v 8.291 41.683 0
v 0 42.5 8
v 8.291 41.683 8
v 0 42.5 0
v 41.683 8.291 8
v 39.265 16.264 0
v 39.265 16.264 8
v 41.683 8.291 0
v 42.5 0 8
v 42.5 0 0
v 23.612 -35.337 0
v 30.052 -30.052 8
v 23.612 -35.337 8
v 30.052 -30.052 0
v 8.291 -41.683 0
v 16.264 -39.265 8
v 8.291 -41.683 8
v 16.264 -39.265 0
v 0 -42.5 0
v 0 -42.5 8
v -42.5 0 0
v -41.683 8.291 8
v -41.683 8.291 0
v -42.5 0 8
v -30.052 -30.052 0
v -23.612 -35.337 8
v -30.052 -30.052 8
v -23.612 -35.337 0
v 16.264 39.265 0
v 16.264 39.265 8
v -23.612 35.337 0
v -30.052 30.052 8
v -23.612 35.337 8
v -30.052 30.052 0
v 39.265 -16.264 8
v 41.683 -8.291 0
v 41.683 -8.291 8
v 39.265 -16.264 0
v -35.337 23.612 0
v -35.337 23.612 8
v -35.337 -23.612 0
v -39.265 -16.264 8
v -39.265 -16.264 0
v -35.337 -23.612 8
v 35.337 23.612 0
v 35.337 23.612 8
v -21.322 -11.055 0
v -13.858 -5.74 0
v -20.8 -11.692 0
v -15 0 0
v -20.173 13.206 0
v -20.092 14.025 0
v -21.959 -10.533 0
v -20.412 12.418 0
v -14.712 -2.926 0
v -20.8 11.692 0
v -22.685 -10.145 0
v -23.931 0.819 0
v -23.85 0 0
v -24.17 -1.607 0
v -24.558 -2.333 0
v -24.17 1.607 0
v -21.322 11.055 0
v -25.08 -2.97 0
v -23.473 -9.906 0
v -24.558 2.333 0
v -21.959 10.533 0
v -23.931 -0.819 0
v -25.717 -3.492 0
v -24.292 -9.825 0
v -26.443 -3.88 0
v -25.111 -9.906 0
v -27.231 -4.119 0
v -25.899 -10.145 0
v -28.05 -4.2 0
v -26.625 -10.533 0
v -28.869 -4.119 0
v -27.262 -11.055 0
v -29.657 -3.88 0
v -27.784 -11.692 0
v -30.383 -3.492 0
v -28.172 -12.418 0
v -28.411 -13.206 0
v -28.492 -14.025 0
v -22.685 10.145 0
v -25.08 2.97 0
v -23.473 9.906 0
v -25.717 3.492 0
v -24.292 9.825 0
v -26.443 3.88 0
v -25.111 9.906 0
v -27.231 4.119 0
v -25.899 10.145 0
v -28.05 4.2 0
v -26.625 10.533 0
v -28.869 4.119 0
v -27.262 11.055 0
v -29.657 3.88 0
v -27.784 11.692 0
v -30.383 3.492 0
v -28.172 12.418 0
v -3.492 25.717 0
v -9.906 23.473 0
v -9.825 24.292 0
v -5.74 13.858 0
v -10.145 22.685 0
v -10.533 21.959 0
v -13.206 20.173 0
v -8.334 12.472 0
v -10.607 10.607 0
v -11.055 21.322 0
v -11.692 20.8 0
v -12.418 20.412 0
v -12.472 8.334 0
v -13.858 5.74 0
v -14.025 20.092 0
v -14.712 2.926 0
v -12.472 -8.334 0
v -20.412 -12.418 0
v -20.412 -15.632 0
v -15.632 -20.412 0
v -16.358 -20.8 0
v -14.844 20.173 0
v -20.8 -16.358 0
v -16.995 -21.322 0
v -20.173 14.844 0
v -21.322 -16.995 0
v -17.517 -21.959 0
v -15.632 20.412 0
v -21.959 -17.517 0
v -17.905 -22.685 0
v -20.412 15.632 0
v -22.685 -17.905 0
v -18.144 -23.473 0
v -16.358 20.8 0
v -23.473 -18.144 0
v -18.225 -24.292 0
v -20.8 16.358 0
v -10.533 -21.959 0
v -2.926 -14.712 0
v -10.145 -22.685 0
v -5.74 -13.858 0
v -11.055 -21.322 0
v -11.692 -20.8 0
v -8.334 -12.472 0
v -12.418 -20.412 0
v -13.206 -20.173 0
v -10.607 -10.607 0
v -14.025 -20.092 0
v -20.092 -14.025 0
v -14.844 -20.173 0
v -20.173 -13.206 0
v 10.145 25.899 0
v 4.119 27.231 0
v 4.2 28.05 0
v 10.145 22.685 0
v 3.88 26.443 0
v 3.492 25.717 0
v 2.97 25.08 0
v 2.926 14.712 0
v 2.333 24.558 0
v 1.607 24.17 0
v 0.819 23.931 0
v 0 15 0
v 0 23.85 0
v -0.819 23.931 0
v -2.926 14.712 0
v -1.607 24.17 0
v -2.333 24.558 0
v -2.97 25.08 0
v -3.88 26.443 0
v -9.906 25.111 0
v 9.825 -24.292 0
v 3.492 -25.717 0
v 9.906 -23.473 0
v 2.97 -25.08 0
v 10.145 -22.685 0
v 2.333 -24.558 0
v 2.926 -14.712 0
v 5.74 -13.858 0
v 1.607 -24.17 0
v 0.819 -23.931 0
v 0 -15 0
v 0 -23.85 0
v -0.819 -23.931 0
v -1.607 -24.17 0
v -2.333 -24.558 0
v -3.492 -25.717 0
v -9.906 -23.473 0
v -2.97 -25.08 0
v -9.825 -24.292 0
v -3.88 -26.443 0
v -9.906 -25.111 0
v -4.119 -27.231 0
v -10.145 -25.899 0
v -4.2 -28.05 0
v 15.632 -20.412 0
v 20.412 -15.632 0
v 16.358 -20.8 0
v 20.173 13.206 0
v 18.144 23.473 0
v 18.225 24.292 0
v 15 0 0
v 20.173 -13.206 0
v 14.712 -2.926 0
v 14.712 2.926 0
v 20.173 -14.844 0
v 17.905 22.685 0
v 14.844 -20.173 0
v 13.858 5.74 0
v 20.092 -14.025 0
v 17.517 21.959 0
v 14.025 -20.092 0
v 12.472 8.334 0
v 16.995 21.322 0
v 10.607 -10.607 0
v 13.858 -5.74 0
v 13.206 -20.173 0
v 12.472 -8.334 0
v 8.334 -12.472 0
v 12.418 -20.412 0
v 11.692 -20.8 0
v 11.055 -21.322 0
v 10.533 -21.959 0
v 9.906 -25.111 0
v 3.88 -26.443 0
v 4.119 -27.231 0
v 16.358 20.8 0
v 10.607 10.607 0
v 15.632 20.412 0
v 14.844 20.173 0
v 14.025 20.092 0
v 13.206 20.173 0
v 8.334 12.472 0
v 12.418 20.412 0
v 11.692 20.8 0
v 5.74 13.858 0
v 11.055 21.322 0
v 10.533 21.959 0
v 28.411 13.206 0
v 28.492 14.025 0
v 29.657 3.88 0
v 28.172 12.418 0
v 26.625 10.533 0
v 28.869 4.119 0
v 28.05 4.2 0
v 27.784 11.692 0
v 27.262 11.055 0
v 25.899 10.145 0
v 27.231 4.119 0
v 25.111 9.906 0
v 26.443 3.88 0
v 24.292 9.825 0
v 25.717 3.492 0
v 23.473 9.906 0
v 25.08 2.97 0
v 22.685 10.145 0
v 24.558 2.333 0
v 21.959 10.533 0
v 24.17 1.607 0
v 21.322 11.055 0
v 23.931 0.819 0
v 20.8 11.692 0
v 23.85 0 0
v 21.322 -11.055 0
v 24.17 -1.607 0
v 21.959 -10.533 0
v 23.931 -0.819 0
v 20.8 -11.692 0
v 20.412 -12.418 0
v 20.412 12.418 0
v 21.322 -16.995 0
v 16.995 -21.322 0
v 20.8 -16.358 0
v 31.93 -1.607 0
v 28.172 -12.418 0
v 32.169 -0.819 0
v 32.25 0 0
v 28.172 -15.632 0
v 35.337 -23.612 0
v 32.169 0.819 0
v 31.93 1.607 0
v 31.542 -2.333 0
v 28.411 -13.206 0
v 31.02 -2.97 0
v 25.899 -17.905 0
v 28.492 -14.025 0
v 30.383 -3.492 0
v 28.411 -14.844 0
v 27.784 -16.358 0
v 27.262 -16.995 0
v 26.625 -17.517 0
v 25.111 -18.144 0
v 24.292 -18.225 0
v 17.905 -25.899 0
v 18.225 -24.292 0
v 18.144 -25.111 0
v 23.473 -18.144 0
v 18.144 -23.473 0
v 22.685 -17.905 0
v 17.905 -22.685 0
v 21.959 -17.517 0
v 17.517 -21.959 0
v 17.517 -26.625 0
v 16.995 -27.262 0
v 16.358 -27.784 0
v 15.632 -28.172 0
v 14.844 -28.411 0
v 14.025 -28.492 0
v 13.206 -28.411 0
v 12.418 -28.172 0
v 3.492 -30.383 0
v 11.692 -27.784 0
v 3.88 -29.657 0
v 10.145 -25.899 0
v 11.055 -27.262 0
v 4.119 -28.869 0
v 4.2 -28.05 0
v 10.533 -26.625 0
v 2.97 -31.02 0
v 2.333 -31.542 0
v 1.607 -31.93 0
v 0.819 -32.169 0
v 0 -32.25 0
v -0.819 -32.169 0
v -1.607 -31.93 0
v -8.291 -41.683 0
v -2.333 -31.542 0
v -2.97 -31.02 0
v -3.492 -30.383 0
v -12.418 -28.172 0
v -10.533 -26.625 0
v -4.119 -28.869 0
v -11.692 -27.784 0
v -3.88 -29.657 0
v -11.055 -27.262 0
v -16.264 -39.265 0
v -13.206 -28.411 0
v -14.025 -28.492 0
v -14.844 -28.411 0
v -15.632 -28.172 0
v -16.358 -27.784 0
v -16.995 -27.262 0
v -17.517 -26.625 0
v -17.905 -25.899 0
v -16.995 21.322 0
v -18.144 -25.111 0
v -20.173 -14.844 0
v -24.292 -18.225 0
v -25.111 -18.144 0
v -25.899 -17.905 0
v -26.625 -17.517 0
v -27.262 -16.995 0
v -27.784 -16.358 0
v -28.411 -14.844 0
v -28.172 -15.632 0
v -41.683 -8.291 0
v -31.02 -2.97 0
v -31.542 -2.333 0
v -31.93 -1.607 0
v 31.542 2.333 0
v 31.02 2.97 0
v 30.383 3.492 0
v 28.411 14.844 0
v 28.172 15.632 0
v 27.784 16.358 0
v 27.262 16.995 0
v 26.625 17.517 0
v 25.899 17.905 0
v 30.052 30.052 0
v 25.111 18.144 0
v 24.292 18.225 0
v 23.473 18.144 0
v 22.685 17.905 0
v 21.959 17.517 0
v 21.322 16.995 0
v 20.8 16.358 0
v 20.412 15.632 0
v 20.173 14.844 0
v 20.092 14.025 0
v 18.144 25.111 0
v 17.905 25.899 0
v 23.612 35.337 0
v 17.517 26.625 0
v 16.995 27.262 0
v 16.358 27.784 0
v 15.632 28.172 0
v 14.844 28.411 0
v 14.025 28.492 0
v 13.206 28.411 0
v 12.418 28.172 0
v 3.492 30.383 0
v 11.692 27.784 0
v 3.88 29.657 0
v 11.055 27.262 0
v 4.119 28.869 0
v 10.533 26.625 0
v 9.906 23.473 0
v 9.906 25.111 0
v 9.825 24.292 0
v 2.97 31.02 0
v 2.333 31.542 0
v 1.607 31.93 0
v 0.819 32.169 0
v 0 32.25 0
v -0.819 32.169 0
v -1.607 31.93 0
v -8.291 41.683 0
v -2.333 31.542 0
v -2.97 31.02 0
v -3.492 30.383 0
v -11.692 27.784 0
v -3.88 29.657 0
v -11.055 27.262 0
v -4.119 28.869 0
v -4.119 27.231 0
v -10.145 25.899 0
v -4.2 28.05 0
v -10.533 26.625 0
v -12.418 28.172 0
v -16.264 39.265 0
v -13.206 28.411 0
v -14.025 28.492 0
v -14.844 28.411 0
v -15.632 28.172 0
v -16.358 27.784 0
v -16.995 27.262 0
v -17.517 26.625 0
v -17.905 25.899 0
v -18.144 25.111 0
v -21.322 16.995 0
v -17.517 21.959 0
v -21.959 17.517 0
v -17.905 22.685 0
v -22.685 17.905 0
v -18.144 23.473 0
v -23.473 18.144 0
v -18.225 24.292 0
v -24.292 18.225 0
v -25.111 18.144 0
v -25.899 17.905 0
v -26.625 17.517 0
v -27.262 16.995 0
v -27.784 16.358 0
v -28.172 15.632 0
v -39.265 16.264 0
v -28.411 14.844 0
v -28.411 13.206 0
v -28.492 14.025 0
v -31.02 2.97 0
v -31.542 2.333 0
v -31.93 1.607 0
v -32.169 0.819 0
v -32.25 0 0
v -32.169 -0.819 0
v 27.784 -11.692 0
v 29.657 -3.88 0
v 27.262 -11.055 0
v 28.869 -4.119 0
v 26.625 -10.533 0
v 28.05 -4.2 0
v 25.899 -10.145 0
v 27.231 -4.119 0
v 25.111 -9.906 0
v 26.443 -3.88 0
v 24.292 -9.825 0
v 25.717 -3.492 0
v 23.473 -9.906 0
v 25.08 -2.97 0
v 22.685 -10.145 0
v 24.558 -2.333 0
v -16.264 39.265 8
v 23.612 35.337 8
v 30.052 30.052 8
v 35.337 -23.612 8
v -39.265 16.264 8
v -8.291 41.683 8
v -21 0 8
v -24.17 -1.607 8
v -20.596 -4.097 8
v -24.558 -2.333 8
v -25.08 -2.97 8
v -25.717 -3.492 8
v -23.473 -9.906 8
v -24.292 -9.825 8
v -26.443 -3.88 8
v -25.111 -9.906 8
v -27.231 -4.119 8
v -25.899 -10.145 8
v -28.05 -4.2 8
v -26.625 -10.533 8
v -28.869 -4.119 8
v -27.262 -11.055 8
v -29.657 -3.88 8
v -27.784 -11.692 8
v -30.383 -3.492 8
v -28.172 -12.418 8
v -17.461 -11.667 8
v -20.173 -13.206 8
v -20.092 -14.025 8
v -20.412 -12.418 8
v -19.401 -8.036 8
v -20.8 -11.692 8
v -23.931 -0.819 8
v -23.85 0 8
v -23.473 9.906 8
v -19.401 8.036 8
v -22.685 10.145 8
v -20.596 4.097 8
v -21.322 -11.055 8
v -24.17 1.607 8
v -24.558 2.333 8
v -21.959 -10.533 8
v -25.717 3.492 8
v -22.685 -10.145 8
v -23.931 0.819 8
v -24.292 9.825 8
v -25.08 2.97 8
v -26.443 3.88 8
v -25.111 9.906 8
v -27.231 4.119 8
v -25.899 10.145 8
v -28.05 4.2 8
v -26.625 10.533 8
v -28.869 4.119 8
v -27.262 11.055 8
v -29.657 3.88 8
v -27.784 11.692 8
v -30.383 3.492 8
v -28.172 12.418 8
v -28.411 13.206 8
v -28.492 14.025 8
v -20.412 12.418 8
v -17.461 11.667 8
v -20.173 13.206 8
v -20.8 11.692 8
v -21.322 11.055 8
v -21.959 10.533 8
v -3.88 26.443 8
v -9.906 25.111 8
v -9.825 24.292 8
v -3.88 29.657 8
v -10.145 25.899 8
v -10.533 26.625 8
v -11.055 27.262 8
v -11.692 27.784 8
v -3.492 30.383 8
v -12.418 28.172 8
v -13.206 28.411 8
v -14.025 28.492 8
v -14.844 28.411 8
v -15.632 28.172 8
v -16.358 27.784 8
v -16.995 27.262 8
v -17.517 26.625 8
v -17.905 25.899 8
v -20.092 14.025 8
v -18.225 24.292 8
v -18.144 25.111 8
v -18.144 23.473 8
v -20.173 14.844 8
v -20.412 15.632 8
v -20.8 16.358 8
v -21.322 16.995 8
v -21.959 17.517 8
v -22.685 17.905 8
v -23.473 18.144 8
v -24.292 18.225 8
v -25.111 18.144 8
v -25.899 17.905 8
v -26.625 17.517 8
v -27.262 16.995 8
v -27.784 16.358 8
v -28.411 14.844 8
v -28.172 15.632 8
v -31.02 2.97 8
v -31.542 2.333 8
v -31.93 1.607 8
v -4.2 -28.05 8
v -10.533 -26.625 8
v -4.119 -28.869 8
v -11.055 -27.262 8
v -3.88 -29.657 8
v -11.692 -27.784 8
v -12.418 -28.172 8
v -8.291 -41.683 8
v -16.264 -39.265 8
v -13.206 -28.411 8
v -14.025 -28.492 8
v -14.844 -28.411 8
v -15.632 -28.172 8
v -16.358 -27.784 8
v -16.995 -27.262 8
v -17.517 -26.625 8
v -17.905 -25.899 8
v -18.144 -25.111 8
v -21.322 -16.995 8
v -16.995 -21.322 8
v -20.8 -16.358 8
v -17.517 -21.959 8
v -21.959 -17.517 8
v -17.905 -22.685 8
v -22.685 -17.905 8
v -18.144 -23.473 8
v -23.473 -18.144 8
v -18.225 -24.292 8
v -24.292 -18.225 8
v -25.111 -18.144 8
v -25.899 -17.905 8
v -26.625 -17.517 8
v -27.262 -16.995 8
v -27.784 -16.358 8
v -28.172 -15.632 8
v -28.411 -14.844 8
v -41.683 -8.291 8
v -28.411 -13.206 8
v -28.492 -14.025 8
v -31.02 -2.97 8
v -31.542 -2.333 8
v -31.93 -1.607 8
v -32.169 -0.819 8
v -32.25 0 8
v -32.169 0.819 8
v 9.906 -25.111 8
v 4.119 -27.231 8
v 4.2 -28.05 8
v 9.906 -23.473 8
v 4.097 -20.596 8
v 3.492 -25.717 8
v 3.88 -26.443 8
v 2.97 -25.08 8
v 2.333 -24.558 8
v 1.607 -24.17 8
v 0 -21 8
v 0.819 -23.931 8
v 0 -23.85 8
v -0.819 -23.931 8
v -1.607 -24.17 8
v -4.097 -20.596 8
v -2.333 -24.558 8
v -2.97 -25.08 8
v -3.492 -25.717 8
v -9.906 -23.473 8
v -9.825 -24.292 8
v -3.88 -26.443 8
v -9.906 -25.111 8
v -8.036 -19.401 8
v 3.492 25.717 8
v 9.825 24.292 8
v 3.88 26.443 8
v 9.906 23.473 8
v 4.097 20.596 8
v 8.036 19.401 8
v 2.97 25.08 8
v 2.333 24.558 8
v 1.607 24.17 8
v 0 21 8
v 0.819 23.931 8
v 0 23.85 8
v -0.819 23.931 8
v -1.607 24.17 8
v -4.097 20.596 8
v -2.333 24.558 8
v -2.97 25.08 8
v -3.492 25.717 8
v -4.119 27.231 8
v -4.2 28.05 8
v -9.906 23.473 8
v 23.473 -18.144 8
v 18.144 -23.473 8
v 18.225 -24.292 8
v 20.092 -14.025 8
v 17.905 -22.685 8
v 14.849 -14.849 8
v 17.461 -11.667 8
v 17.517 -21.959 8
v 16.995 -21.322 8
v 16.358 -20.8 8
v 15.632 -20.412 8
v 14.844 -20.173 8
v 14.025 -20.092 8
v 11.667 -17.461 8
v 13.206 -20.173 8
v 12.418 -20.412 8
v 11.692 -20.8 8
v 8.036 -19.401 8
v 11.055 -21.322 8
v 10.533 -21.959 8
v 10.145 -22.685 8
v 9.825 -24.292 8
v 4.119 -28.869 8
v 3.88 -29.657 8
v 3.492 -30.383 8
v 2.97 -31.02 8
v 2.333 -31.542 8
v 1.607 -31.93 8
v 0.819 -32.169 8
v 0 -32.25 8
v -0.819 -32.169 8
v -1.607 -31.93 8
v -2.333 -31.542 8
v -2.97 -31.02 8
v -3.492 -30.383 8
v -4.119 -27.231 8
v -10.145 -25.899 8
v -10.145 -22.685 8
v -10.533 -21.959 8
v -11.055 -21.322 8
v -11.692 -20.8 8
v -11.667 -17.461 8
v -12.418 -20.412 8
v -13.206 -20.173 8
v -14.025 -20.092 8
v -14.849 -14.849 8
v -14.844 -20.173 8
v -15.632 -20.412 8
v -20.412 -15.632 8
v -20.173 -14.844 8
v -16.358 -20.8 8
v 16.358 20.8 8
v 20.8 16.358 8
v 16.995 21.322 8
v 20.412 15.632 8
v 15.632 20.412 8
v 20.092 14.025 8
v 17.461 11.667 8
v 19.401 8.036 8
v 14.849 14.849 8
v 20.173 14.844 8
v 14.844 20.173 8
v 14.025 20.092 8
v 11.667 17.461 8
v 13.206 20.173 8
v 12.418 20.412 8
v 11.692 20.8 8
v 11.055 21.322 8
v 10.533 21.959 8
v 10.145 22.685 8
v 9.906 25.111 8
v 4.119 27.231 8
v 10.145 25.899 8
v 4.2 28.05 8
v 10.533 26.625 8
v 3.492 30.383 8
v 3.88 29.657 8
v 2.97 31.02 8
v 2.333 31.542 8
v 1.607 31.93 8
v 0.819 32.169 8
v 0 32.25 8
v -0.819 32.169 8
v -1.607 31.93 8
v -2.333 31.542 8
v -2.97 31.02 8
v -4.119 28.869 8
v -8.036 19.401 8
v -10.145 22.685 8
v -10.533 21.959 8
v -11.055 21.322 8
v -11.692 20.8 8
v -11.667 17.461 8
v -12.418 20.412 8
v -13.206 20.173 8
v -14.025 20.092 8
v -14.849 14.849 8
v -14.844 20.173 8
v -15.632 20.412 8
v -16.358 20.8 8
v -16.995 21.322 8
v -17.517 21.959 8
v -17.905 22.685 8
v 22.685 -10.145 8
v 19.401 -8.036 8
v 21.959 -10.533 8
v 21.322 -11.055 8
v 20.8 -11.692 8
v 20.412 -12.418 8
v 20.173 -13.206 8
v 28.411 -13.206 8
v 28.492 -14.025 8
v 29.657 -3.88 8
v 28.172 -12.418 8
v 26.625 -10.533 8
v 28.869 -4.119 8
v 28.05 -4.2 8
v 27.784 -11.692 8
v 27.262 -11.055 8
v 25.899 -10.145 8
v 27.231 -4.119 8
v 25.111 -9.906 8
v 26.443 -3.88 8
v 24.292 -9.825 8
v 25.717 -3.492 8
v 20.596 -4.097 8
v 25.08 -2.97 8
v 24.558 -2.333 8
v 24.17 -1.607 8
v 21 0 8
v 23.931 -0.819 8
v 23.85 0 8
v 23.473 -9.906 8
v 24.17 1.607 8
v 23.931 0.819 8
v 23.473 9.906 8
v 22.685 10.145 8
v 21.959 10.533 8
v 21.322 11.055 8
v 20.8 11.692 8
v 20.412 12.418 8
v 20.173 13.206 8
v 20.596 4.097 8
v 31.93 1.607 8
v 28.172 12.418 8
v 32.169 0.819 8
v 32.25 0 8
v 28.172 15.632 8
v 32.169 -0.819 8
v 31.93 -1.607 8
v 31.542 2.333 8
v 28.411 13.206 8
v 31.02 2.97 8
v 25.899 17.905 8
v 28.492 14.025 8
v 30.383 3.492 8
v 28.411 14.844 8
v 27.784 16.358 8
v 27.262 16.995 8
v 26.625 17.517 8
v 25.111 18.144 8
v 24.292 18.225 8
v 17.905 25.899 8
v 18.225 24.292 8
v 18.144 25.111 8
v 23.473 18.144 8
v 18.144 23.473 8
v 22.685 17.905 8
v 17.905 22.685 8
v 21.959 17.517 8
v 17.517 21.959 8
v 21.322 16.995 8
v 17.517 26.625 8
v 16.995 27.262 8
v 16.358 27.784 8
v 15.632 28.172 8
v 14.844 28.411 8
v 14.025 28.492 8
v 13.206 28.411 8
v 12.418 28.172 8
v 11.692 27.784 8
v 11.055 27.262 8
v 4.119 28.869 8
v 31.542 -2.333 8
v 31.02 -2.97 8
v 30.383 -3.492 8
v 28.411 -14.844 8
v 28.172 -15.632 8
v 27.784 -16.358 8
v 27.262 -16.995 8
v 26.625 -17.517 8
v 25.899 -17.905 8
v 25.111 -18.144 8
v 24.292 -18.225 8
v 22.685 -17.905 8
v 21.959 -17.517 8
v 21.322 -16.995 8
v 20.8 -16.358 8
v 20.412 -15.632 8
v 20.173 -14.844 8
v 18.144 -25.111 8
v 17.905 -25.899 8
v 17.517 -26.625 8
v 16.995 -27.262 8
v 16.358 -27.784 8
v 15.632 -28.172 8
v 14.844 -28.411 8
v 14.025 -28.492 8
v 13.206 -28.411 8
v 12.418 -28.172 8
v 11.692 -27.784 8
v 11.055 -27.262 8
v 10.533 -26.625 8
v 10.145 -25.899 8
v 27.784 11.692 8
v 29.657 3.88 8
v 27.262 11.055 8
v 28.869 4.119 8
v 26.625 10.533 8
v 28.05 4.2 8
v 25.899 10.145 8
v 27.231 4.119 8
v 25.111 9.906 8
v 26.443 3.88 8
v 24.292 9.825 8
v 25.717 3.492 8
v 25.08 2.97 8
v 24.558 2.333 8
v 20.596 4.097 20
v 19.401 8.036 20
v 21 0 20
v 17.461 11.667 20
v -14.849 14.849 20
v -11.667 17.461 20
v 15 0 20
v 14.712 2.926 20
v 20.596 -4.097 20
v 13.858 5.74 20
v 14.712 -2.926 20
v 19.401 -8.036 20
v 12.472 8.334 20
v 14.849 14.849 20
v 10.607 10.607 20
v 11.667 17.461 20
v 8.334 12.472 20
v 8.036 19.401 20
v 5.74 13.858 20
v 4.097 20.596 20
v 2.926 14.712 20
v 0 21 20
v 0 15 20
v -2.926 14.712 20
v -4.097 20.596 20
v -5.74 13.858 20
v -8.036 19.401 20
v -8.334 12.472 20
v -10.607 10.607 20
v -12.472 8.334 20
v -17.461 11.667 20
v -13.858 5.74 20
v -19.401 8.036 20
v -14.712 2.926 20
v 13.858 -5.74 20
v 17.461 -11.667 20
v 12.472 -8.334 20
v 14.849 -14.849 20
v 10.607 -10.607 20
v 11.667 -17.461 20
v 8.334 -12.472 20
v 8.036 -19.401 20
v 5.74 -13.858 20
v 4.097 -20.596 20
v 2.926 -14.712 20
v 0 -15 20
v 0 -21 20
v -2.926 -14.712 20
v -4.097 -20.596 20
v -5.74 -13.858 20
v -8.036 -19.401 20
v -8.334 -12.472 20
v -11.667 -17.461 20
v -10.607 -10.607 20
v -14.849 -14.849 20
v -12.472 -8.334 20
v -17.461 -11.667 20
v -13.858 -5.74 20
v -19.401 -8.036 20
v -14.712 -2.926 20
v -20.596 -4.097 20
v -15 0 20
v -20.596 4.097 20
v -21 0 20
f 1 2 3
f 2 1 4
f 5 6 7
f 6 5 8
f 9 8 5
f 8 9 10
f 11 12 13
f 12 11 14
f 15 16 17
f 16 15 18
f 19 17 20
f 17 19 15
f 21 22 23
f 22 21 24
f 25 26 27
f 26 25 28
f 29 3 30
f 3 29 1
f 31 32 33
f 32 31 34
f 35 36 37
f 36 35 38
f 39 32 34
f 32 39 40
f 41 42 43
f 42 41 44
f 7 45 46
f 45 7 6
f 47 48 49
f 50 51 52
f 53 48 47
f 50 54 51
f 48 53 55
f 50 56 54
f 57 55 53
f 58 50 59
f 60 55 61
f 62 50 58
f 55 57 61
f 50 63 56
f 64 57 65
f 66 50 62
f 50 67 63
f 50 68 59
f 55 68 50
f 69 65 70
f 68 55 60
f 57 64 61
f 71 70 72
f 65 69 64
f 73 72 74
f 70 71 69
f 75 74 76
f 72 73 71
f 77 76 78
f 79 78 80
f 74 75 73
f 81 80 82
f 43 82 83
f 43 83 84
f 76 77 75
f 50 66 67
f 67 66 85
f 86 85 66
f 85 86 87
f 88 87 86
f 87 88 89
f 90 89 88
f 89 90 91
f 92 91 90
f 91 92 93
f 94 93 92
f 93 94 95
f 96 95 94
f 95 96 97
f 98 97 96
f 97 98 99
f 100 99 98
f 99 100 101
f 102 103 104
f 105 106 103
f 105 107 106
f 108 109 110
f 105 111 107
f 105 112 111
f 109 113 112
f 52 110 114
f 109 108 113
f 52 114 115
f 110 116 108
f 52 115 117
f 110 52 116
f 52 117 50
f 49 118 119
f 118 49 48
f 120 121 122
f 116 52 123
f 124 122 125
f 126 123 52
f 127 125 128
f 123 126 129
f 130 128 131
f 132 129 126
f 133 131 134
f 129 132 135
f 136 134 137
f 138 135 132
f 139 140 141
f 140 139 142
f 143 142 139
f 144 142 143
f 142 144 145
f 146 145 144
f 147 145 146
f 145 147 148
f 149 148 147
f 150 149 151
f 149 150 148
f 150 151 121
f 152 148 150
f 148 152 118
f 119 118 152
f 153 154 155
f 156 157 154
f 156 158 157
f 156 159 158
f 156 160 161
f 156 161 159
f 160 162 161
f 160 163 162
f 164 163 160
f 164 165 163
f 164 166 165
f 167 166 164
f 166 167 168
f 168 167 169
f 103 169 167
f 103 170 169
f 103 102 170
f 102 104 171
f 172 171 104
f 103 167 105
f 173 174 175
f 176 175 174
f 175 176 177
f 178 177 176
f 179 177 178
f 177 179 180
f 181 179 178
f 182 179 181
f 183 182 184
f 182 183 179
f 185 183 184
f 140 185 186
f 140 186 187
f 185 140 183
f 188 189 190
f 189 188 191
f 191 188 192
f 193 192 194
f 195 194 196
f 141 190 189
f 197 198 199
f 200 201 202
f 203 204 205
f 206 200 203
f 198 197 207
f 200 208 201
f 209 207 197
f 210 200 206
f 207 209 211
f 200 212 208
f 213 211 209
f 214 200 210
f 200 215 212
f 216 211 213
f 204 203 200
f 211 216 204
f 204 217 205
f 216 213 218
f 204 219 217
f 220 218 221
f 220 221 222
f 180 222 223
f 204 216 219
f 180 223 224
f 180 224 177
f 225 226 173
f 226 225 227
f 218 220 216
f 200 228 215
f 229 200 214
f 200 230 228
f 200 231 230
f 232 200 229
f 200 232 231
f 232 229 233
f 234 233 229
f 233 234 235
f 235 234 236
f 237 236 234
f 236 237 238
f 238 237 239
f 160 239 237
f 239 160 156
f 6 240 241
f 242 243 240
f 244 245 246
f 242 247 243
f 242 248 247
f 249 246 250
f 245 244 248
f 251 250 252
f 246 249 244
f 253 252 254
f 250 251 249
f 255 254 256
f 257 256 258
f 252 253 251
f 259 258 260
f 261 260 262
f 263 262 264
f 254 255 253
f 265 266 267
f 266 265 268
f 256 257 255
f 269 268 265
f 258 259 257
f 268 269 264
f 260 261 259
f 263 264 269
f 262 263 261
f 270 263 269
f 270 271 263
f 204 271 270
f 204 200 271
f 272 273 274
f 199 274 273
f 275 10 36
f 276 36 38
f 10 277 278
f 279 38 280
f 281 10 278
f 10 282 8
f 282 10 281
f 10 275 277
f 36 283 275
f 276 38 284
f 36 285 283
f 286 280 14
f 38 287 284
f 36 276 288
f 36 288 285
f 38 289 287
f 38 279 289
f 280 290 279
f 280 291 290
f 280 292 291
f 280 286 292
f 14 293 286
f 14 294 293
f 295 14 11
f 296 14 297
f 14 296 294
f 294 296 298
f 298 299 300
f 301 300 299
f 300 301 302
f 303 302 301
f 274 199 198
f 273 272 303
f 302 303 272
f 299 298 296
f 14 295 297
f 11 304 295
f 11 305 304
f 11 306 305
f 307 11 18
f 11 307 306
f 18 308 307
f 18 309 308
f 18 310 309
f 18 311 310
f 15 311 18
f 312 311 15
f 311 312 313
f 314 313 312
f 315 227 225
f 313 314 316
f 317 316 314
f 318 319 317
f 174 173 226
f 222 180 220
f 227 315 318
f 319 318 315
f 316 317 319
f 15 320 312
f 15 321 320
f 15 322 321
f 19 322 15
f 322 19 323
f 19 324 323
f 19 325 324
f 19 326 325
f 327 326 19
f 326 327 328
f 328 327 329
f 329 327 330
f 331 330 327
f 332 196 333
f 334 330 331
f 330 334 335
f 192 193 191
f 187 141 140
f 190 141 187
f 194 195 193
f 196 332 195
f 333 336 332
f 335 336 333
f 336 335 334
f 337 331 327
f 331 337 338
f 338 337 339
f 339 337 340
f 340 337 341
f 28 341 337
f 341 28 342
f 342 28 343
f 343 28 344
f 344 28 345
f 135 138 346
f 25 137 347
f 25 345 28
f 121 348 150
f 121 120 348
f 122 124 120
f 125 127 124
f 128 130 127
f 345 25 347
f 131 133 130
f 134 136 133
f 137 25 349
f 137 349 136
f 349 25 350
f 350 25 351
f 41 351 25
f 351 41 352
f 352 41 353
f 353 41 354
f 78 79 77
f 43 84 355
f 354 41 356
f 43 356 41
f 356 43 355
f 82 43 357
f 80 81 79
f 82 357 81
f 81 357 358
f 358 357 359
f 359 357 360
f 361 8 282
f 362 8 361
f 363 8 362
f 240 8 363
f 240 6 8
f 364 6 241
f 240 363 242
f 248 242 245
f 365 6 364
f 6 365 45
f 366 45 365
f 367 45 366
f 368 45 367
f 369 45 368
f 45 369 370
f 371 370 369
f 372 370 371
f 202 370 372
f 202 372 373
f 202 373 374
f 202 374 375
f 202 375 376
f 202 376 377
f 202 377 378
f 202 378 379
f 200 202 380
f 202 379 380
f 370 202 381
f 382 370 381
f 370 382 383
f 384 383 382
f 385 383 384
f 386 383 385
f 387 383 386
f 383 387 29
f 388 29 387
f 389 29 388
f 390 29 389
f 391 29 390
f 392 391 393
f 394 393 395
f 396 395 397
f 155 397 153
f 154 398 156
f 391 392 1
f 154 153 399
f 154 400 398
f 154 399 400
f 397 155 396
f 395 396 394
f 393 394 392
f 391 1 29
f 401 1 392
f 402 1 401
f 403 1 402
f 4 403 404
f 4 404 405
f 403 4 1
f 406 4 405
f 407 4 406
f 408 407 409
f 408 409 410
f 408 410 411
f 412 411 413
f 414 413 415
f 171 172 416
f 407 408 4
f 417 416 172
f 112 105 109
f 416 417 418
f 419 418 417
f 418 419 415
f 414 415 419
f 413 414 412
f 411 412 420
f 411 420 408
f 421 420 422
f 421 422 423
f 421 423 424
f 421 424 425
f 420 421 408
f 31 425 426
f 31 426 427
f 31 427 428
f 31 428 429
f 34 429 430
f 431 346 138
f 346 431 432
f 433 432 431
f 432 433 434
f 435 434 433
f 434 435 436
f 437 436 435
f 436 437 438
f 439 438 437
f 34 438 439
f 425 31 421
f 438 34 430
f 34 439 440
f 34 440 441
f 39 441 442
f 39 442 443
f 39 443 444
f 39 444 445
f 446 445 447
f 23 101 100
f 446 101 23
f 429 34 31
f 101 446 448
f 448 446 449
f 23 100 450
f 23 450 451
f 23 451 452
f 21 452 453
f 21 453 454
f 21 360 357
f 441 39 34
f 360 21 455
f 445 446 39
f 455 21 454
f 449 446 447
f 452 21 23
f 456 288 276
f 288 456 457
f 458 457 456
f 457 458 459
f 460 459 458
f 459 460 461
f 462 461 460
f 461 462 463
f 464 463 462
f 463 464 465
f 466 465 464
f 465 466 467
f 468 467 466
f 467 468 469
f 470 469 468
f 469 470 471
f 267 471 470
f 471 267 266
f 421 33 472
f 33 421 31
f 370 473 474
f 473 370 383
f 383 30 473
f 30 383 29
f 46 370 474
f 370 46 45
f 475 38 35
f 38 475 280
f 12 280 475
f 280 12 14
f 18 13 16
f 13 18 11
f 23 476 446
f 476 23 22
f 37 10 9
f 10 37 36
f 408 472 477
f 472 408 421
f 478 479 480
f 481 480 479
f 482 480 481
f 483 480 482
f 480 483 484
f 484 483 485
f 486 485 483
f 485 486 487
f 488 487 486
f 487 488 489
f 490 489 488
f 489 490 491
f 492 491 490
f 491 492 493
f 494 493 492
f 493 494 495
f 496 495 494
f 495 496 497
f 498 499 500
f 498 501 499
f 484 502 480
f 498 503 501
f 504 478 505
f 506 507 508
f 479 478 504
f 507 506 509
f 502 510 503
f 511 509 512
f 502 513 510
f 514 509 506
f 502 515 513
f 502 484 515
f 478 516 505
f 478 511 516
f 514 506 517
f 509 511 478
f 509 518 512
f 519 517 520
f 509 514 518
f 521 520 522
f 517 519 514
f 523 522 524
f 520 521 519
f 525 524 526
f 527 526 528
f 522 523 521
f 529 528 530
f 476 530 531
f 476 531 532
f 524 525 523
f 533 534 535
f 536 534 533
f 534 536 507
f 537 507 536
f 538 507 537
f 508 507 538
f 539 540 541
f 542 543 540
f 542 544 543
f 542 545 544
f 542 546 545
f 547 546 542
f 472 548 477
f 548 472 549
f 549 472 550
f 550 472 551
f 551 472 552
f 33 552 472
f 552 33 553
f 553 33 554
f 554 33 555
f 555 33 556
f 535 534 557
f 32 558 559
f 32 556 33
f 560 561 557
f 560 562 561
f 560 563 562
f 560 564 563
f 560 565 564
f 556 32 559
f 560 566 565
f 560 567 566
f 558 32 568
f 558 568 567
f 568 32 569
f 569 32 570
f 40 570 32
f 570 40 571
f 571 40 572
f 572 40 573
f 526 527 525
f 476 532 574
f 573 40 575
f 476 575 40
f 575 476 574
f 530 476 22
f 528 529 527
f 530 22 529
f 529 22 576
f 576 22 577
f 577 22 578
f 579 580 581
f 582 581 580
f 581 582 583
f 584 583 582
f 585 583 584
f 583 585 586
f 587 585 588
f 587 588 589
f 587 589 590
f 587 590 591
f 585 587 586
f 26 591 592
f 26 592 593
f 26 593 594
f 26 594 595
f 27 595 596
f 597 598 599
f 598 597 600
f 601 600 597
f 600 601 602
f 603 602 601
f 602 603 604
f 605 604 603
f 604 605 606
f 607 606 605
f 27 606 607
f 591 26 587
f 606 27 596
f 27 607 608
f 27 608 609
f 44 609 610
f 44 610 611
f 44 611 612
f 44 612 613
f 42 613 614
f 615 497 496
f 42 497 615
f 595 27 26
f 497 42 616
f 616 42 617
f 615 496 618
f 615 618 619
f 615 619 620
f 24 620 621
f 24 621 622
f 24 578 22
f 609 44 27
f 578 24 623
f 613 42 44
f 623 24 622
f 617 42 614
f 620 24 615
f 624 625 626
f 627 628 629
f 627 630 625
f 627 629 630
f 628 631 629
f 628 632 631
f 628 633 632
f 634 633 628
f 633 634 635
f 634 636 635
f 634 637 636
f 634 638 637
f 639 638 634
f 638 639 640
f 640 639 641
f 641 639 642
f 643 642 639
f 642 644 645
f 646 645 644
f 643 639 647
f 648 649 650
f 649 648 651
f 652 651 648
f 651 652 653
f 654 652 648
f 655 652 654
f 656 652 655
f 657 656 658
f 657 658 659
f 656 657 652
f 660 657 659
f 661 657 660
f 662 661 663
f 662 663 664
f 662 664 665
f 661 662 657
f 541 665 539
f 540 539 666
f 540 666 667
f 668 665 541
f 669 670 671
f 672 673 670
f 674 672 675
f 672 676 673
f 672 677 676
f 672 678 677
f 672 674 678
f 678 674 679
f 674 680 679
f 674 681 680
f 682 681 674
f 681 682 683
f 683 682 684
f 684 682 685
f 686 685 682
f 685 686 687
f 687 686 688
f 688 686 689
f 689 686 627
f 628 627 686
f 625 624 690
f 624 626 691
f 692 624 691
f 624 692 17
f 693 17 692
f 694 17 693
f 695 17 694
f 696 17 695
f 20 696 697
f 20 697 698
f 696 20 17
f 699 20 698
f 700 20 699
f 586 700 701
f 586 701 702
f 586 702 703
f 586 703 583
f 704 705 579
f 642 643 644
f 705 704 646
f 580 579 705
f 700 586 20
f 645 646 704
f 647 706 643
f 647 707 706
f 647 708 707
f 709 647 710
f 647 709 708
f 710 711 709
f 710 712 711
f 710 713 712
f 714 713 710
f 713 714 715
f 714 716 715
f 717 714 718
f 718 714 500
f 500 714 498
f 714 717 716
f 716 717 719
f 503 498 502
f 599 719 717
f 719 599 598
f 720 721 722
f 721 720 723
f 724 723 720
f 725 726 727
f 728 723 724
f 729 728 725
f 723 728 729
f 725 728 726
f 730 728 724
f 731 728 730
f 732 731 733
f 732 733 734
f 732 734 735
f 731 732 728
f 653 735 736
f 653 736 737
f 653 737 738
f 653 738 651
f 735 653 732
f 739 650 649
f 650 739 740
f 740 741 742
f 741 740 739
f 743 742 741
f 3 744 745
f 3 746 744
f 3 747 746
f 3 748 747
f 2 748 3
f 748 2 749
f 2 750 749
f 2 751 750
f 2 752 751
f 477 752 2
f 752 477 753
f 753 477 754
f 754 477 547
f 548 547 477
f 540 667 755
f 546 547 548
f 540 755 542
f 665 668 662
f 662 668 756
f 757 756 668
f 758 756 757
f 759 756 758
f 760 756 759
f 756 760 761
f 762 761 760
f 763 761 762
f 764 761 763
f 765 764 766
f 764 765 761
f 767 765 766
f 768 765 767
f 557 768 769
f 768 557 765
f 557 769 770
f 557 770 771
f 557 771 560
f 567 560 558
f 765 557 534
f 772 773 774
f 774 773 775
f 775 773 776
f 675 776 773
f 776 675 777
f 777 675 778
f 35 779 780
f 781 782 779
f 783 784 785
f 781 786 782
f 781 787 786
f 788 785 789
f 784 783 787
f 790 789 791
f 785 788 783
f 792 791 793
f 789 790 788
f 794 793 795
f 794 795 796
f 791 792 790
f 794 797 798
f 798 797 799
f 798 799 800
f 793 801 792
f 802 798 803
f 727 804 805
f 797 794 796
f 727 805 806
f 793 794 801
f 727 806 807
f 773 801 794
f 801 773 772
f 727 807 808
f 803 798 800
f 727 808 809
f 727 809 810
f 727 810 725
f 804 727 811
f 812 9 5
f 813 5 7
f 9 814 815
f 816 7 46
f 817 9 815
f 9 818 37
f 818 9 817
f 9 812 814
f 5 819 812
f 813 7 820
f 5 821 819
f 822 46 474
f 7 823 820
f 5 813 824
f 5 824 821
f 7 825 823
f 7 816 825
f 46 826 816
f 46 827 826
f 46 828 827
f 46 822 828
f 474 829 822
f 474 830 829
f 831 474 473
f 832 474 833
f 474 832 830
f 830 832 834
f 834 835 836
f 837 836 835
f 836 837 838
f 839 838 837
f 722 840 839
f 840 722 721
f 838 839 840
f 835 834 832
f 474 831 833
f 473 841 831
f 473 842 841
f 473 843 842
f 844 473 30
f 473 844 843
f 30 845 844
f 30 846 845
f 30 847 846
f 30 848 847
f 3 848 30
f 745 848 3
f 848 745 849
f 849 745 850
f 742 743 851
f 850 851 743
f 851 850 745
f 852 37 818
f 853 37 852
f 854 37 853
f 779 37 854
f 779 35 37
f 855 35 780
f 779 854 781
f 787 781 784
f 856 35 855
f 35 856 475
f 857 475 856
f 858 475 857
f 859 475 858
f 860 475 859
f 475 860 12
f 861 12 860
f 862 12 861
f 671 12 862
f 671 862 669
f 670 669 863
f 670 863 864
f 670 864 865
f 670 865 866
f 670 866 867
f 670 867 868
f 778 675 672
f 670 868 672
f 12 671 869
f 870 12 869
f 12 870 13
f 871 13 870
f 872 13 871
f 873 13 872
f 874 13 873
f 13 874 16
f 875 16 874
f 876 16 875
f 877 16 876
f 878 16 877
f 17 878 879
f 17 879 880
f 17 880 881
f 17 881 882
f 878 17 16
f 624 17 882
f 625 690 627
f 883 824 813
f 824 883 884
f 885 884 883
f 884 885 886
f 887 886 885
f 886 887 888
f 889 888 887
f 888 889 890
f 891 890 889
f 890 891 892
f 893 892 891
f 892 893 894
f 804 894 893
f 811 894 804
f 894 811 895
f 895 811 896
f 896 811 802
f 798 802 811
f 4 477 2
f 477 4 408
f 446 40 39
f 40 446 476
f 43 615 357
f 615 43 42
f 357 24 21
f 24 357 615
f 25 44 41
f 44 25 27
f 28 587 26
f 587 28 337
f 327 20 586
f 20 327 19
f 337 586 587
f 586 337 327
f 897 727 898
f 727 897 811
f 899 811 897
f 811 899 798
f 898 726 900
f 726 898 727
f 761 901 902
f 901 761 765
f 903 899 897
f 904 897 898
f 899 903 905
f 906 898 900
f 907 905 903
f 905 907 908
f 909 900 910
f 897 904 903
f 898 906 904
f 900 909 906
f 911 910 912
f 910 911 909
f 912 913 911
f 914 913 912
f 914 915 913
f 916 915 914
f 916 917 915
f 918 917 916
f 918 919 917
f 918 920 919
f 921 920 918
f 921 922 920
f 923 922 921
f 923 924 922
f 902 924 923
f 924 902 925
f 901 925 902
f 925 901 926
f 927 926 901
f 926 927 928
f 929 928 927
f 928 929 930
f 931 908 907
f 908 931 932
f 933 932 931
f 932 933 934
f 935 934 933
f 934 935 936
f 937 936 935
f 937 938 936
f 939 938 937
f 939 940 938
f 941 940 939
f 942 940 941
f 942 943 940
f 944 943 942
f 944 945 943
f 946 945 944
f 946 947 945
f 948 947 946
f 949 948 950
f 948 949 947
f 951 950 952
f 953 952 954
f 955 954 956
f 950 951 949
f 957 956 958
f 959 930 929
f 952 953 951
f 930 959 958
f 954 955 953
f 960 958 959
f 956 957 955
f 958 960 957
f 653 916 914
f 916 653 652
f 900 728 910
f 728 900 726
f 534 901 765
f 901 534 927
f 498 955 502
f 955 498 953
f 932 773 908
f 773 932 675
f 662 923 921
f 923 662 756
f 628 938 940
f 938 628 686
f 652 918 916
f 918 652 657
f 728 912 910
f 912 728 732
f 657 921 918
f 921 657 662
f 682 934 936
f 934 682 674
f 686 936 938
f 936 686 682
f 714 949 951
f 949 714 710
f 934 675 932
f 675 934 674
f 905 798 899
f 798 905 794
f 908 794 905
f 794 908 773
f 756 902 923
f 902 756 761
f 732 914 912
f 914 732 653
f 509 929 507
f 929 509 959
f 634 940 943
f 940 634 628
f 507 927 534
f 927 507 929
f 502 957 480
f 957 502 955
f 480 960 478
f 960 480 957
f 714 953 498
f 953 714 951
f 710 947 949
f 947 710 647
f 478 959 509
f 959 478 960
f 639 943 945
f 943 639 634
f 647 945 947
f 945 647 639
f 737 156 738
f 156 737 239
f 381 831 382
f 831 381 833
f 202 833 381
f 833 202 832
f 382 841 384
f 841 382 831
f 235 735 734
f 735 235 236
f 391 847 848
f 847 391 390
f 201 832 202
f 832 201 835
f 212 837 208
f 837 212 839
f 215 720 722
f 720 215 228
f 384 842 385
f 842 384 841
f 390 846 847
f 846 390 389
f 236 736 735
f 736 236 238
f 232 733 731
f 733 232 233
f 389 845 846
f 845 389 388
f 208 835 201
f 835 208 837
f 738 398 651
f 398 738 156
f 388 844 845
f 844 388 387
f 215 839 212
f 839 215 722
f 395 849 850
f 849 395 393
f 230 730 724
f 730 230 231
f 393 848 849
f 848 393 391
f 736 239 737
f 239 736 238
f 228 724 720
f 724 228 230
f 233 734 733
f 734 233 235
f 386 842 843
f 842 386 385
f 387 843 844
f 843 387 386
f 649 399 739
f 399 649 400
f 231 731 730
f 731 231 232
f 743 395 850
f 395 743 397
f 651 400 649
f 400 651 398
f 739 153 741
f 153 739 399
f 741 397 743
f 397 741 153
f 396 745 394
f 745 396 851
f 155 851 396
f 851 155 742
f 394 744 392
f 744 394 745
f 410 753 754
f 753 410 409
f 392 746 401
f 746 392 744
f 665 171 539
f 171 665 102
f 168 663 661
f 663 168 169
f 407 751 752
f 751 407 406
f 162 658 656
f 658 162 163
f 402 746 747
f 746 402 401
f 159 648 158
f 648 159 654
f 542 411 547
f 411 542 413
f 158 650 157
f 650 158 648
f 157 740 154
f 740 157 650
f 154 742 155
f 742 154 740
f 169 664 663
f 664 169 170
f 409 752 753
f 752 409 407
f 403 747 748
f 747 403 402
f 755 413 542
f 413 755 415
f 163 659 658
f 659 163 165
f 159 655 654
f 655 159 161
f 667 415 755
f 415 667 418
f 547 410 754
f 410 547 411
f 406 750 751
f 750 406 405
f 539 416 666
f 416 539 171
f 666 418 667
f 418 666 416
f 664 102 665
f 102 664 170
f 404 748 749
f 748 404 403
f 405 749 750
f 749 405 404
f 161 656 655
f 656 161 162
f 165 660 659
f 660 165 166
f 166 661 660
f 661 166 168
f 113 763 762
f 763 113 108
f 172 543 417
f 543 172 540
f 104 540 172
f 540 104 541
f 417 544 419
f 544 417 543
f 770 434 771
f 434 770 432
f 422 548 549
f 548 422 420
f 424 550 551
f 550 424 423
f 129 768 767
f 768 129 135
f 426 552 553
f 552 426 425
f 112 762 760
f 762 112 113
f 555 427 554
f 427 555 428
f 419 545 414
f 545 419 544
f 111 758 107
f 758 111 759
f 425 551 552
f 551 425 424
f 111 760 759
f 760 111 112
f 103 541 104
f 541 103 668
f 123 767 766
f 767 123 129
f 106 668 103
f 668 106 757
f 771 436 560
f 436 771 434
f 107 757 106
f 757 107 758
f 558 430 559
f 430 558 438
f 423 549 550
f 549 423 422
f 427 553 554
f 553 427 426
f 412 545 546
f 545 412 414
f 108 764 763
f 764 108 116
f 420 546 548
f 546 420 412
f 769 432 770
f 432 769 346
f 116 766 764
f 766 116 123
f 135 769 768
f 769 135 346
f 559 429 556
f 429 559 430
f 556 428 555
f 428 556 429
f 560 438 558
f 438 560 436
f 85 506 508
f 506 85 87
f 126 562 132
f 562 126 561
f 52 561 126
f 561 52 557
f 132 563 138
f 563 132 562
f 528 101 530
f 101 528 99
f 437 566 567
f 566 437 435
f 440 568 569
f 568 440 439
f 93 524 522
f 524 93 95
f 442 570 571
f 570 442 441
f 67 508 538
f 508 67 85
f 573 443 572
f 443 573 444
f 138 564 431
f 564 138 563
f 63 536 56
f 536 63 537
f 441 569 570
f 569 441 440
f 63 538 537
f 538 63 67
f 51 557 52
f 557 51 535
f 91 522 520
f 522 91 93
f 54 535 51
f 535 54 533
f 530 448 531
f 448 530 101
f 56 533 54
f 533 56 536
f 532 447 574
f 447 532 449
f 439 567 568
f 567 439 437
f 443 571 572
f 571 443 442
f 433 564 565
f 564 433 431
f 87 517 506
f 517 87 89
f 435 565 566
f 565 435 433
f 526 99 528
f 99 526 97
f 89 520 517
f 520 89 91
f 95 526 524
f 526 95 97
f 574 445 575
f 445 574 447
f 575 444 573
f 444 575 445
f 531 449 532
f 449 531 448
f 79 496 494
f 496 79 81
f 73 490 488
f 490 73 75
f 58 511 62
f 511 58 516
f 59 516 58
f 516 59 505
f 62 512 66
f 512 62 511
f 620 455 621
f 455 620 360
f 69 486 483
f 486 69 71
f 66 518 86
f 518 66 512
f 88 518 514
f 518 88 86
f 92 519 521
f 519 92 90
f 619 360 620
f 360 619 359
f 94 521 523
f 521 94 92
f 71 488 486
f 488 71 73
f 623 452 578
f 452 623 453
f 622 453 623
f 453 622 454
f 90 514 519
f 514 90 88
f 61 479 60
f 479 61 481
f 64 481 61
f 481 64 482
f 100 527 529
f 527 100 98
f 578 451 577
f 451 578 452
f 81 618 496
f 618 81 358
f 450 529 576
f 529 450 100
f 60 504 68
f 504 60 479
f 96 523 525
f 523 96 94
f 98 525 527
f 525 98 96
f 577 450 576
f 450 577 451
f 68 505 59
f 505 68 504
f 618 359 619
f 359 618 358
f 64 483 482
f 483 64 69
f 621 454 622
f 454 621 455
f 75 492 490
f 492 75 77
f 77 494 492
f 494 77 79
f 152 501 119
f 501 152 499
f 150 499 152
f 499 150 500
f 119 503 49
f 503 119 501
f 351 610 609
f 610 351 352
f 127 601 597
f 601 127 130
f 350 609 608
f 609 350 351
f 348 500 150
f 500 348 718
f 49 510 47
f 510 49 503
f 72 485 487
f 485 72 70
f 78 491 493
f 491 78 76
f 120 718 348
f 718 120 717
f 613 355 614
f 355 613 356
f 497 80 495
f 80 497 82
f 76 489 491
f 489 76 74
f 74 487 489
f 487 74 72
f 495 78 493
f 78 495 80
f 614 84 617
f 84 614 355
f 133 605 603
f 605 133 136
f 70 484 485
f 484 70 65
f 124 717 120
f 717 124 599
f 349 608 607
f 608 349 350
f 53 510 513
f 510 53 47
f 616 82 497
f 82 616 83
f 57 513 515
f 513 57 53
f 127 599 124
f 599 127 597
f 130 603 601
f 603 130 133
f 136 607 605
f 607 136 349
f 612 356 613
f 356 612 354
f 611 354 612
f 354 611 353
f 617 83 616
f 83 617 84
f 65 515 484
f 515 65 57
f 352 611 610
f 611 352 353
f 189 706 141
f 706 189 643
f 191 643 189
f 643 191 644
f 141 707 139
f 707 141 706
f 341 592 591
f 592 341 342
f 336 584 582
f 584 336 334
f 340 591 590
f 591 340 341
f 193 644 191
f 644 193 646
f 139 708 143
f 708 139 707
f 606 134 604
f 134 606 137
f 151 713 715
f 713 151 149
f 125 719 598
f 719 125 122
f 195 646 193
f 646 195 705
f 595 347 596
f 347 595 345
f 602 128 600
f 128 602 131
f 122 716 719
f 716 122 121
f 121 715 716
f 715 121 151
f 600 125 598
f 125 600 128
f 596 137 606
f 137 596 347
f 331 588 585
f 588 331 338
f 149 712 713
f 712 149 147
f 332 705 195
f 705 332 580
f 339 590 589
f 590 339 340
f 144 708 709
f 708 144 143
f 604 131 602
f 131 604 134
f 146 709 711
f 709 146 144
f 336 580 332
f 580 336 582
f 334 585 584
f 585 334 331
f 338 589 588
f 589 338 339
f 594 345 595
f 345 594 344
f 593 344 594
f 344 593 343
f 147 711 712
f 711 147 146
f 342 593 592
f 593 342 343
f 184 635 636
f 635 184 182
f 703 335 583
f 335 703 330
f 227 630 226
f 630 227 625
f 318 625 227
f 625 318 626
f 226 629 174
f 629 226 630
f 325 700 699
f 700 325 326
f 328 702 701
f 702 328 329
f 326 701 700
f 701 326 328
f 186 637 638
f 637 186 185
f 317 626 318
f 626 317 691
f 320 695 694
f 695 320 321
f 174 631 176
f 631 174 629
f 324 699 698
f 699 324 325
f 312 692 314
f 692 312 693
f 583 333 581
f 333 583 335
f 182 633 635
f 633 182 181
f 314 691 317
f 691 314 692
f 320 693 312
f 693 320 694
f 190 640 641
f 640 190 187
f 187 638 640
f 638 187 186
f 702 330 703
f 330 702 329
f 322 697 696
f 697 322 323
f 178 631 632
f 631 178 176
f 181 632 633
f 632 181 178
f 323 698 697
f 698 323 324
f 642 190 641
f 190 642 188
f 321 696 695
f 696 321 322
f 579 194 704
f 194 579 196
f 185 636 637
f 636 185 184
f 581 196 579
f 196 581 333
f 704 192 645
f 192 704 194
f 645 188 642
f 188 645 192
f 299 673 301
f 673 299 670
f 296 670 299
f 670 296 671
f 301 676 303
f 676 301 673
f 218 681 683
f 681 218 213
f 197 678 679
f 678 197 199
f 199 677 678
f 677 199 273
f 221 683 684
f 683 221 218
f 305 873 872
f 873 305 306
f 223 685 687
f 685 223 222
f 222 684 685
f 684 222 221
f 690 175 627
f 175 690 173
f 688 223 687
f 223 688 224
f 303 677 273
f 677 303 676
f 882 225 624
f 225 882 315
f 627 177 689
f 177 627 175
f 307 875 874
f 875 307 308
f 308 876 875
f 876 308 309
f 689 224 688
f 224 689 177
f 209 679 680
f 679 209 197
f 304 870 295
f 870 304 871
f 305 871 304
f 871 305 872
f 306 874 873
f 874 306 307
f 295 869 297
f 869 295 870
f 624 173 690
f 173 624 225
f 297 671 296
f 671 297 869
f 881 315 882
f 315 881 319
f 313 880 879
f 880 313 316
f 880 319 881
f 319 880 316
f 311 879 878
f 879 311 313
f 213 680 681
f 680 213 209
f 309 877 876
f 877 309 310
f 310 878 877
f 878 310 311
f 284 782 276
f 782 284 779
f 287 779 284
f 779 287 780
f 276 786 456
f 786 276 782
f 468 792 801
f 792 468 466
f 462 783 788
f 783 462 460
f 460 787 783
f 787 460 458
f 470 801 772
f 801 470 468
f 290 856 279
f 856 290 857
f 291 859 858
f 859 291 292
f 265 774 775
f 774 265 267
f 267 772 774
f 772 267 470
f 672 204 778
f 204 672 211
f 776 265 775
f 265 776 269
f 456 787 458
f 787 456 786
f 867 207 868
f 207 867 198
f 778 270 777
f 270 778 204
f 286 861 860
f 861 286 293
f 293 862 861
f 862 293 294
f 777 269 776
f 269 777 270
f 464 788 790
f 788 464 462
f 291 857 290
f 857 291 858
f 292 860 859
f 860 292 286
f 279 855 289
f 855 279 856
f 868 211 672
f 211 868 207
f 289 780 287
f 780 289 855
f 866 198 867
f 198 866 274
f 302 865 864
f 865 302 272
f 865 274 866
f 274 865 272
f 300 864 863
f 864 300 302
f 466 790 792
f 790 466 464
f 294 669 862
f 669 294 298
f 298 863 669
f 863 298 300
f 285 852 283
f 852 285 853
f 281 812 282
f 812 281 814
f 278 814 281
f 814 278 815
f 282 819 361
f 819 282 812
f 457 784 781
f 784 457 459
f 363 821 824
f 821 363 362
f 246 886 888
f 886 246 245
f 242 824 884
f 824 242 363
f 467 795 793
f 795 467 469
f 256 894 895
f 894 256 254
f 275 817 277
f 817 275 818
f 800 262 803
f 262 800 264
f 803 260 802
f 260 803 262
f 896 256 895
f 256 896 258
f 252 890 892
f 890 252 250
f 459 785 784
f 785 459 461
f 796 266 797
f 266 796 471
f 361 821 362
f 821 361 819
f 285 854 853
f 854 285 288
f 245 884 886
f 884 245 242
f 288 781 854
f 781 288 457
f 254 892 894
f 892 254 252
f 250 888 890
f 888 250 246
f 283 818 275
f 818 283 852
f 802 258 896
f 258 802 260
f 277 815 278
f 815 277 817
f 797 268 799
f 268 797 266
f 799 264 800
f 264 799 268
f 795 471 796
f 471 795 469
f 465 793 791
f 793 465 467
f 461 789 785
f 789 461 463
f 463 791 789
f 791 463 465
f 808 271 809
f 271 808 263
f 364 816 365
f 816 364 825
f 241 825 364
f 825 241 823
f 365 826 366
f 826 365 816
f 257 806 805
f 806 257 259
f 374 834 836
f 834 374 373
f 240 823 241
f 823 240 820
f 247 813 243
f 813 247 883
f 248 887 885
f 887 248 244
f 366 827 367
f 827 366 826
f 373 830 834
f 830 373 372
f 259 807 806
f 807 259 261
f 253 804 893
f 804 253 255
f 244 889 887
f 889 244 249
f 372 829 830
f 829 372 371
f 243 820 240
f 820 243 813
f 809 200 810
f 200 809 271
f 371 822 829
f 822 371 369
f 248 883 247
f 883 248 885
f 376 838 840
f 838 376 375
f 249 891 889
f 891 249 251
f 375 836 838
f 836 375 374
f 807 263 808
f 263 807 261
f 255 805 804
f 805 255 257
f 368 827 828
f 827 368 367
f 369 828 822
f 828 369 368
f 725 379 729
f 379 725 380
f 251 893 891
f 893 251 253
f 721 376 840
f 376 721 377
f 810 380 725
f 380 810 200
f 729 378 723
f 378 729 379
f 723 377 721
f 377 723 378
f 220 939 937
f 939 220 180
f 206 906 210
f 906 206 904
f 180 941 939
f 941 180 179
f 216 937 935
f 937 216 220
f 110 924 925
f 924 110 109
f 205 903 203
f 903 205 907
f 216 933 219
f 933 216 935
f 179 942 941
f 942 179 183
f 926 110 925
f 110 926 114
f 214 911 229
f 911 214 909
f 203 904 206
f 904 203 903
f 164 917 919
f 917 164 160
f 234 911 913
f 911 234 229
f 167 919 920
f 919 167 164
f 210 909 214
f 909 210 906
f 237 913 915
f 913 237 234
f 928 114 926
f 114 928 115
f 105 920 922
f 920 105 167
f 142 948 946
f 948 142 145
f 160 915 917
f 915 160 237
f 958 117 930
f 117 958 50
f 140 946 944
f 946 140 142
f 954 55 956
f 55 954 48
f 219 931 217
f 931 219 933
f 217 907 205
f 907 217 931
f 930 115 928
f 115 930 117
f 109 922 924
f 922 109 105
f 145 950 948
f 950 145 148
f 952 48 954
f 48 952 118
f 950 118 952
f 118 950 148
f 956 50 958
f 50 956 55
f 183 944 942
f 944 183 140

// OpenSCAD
$fn = 32;

// ----------------------------------------------------------------------
// Flange Ø85 x 8
// 12 holes on a Ø56.1 bolt circle, bolted joints
// ----------------------------------------------------------------------

// --- parameters (mm) ---
flange_d = 85;   // outside diameter of the flange
thickness = 8;   // flange thickness
holes = 12;      // number of bolt holes
pcd = 56.1;      // bolt circle diameter
start_deg = 60;  // angle of the first hole, from +X
hole_d = 8.4;    // bolt hole diameter
bore_d = 30;     // central through bore
hub_d = 42;      // hub outside diameter
hub_h = 12;      // hub height above the flange face (0 = no hub)

// --- derived feature positions (mm) ---
height = thickness + hub_h;  // = 20   overall height of the part
pcd_r = pcd / 2;             // = 28.05   bolt circle radius
hole_step = 360 / holes;     // = 30   angular pitch
feature_centers = [
  [pcd_r * cos(start_deg + 0 * hole_step), pcd_r * sin(start_deg + 0 * hole_step)],
  [pcd_r * cos(start_deg + 1 * hole_step), pcd_r * sin(start_deg + 1 * hole_step)],
  [pcd_r * cos(start_deg + 2 * hole_step), pcd_r * sin(start_deg + 2 * hole_step)],
  [pcd_r * cos(start_deg + 3 * hole_step), pcd_r * sin(start_deg + 3 * hole_step)],
  [pcd_r * cos(start_deg + 4 * hole_step), pcd_r * sin(start_deg + 4 * hole_step)],
  [pcd_r * cos(start_deg + 5 * hole_step), pcd_r * sin(start_deg + 5 * hole_step)],
  [pcd_r * cos(start_deg + 6 * hole_step), pcd_r * sin(start_deg + 6 * hole_step)],
  [pcd_r * cos(start_deg + 7 * hole_step), pcd_r * sin(start_deg + 7 * hole_step)],
  [pcd_r * cos(start_deg + 8 * hole_step), pcd_r * sin(start_deg + 8 * hole_step)],
  [pcd_r * cos(start_deg + 9 * hole_step), pcd_r * sin(start_deg + 9 * hole_step)],
  [pcd_r * cos(start_deg + 10 * hole_step), pcd_r * sin(start_deg + 10 * hole_step)],
  [pcd_r * cos(start_deg + 11 * hole_step), pcd_r * sin(start_deg + 11 * hole_step)]
];   // bolt hole centres on the pitch circle

// flange disc, every hole and the bore cut straight through
difference() {
  union() {
    cylinder(d = flange_d, h = thickness);
    cylinder(d = hub_d, h = height);  // hub, overlapped into the flange
  }
  translate([0, 0, -1]) cylinder(d = bore_d, h = height + 2);  // bore, through
  for (centre = feature_centers)
    translate([centre[0], centre[1], -1]) cylinder(d = hole_d, h = thickness + 2);
}
